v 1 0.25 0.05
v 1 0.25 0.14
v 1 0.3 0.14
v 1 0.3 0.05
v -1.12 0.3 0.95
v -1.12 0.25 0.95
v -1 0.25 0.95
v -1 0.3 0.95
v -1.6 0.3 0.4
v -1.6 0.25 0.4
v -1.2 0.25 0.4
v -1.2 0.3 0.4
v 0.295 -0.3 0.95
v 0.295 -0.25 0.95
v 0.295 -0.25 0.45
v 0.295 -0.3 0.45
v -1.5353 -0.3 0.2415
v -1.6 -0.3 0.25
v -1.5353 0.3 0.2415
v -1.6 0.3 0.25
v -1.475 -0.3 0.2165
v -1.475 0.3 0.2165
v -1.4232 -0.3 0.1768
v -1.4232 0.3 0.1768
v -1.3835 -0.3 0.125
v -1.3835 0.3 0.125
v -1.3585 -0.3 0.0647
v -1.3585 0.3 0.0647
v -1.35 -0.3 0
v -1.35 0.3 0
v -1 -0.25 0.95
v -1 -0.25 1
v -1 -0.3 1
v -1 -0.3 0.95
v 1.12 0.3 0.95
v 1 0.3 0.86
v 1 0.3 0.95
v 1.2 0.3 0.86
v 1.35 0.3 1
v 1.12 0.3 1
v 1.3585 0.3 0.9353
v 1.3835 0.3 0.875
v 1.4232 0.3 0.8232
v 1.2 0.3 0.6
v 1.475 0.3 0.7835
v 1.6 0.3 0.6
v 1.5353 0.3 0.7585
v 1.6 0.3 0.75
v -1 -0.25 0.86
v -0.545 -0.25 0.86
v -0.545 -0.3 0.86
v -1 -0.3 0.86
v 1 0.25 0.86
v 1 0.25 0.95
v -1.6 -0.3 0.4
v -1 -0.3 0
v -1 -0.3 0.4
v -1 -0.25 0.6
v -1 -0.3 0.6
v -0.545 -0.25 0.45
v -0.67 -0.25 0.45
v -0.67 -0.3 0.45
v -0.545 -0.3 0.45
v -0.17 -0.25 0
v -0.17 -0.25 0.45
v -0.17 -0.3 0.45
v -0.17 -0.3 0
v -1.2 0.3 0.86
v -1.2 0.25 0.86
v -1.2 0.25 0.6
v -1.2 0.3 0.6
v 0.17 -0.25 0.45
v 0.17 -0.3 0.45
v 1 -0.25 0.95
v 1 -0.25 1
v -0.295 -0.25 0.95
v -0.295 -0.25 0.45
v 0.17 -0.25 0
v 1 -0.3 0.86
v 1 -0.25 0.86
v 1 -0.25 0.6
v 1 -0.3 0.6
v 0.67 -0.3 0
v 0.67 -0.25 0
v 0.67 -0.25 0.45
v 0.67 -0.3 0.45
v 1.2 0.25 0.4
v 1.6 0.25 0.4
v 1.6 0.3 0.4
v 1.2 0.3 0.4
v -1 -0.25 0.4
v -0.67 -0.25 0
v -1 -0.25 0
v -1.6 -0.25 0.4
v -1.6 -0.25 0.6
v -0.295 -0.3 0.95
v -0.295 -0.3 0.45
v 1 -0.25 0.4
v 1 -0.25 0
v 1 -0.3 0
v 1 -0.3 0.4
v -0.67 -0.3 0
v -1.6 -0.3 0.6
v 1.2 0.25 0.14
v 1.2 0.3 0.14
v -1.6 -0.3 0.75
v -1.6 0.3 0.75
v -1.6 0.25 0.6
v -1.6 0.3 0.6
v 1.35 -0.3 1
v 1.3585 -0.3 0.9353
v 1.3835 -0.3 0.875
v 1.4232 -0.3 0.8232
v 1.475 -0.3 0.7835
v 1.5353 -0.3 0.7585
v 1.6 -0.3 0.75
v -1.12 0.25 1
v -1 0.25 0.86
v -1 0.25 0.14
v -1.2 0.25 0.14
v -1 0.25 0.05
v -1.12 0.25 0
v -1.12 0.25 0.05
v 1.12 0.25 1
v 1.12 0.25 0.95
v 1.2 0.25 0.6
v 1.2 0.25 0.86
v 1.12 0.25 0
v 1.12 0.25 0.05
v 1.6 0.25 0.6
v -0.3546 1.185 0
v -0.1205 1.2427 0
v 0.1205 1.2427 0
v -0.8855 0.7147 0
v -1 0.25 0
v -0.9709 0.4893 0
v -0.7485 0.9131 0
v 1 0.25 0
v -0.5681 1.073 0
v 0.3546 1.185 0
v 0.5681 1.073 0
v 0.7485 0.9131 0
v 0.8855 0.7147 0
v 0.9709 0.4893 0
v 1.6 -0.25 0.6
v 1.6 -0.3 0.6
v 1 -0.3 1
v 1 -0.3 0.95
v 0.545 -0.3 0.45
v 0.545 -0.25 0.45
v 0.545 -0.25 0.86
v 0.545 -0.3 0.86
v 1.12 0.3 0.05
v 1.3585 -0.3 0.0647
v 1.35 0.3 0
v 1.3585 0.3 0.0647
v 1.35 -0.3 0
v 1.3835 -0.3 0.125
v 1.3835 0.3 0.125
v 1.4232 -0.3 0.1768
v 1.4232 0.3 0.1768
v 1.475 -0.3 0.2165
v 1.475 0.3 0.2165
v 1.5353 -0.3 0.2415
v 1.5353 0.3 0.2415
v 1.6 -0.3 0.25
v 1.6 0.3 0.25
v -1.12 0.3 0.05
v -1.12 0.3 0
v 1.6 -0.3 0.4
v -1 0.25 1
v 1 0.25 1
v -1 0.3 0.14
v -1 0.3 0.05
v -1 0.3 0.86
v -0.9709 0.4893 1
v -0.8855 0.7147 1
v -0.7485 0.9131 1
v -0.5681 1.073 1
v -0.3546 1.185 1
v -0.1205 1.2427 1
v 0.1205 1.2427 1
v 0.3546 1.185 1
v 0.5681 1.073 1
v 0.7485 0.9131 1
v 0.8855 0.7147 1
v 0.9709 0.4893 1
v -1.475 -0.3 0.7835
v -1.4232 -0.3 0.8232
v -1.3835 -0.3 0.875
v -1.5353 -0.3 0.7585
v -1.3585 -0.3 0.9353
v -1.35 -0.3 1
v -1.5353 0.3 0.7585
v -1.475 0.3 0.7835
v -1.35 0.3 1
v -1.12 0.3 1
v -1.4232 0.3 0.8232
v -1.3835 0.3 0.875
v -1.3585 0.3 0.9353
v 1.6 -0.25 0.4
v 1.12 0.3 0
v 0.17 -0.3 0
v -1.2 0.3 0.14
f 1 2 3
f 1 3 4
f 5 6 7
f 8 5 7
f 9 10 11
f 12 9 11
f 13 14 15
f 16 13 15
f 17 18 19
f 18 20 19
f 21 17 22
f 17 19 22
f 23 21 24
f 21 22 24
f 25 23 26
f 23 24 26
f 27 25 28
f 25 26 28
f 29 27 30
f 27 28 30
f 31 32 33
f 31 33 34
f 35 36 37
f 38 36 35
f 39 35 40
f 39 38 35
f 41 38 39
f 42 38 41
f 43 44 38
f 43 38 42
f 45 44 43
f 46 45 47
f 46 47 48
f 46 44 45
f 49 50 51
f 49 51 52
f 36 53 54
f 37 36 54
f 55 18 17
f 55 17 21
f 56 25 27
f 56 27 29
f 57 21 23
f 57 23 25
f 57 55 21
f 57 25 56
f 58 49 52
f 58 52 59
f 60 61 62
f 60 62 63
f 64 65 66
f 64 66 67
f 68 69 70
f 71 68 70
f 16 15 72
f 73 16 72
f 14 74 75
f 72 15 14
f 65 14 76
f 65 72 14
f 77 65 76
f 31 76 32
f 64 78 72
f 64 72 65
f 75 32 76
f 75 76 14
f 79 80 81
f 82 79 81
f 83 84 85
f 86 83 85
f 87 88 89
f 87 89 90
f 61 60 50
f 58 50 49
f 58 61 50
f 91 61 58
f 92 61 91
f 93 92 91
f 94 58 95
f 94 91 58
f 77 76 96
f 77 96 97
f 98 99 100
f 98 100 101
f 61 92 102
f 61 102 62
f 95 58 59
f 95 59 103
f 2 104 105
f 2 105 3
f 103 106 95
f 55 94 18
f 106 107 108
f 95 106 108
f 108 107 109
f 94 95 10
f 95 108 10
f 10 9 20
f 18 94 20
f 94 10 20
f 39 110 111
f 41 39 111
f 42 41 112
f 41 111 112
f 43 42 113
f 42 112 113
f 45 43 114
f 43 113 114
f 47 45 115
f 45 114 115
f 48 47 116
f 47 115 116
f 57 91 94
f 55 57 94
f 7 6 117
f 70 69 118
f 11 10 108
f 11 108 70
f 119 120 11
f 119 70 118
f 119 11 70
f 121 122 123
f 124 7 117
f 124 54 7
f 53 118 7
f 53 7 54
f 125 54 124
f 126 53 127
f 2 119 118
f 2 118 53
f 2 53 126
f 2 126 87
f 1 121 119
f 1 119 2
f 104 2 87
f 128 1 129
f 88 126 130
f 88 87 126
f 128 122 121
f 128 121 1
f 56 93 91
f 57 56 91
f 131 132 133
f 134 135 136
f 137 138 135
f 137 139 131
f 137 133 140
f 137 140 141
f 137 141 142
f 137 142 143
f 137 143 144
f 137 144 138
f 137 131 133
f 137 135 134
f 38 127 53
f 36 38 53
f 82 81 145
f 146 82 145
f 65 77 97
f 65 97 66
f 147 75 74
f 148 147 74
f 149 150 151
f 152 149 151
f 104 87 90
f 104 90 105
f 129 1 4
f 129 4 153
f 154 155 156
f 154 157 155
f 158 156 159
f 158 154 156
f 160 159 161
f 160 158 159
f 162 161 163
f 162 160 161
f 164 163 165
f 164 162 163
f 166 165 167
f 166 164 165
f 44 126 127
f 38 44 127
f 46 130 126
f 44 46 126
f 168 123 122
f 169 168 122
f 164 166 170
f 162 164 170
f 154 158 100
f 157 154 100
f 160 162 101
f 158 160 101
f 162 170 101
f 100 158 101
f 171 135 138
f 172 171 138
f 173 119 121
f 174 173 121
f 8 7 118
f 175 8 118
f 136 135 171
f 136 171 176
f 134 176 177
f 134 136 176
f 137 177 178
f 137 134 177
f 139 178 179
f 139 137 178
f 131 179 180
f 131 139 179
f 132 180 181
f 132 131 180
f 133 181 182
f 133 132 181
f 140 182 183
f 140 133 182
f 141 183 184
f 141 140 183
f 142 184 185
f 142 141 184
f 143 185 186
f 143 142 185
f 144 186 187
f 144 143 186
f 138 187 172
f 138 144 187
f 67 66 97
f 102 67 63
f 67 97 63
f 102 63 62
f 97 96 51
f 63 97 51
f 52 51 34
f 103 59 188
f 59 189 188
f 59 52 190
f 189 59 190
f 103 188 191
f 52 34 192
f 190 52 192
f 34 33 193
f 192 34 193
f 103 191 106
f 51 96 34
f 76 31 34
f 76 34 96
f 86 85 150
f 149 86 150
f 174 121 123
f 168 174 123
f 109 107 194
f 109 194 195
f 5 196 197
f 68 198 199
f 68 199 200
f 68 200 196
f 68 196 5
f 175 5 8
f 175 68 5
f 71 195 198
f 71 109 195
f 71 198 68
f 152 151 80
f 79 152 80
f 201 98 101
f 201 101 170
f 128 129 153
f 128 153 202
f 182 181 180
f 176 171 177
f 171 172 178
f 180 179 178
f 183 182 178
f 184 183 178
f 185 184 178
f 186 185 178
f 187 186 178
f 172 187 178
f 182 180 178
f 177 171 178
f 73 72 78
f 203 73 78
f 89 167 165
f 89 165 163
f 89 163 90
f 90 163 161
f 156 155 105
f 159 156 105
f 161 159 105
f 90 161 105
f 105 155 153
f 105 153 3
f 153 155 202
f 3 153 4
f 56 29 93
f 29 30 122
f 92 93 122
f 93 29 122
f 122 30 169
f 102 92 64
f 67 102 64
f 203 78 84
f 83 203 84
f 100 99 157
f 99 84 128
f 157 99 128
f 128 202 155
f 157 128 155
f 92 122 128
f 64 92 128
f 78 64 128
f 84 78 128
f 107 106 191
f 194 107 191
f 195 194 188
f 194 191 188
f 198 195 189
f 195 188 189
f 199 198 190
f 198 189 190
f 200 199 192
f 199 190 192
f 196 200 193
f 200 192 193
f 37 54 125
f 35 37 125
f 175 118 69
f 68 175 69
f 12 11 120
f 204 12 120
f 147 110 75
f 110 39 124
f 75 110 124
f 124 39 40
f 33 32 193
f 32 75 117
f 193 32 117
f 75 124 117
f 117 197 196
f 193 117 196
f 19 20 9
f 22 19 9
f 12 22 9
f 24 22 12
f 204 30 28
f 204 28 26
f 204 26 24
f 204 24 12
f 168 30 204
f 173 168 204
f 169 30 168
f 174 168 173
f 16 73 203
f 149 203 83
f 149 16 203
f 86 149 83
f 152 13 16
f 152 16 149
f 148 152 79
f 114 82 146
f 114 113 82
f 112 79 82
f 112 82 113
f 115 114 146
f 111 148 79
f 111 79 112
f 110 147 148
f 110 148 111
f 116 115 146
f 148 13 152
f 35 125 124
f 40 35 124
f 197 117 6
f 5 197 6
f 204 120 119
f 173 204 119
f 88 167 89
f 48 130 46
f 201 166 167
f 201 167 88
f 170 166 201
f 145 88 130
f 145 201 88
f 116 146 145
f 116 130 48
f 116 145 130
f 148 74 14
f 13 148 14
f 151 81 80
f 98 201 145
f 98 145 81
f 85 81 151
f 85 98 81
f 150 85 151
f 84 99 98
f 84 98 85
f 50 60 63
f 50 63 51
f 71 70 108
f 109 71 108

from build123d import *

# Parameters (mm, degrees)
EXTRUDE_1_DEPTH     = 1
CUT_EXTRUDE_1_DEPTH = 0.5
EXTRUDE_2_DEPTH     = 0.05
EXTRUDE_4_DEPTH     = 0.05


# Read off the part's stored shape, not the designer's step: Разделить1
with BuildPart() as part:
    # Эскиз1 → Бобышка-Вытянуть1 (new body)
    with BuildSketch(Plane.XY):
        with BuildLine():
            Line((-1.6, 0.25), (-1, 0.25))
            ThreePointArc((-1, 0.25), (0, 1.25), (1, 0.25))
            Line((1, 0.25), (1.6, 0.25))
            Line((1.6, 0.25), (1.6, -0.25))
            Line((1.6, -0.25), (-1.6, -0.25))
            Line((-1.6, -0.25), (-1.6, 0.25))
        make_face()
    extrude(amount=EXTRUDE_1_DEPTH)


with BuildPart() as body_2:
    # Split Bodies 1: the piece on the far side of the plane
    add(part.part)
    split(bisect_by=Plane(origin=(0, 0.25, 0), x_dir=(1, 0, 0), z_dir=(0, 1, 0)), keep=Keep.BOTTOM)

    # Эскиз2 → Вырез-Вытянуть1 (cut)
    with BuildSketch(Plane.XZ.offset(0.25)):
        with BuildLine():
            Line((-1.35, 0), (-1.6, 0))
            Line((-1.6, 0), (-1.6, 0.25))
            ThreePointArc((-1.6, 0.25), (-1.423223305, 0.176776695), (-1.35, 0))
        make_face()
        with BuildLine():
            Line((-1.35, 1), (-1.6, 1))
            Line((-1.6, 1), (-1.6, 0.75))
            ThreePointArc((-1.6, 0.75), (-1.423223305, 0.823223305), (-1.35, 1))
        make_face()
        with BuildLine():
            Line((1.6, 0.75), (1.6, 1))
            Line((1.6, 1), (1.35, 1))
            ThreePointArc((1.35, 1), (1.423223305, 0.823223305), (1.6, 0.75))
        make_face()
        with BuildLine():
            Line((1.6, 0.25), (1.6, 0))
            Line((1.6, 0), (1.35, 0))
            ThreePointArc((1.35, 0), (1.423223305, 0.176776695), (1.6, 0.25))
        make_face()
    extrude(amount=-CUT_EXTRUDE_1_DEPTH, mode=Mode.SUBTRACT)

    # Эскиз3 → Бобышка-Вытянуть2 (add)
    with BuildSketch(Plane.XZ.offset(0.25)):
        with BuildLine():
            Line((-1, 0), (-1, 0.4))
            Line((-1, 0.4), (-1.6, 0.4))
            Line((-1.6, 0.4), (-1.6, 0.25))
            ThreePointArc((-1.6, 0.25), (-1.423223305, 0.176776695), (-1.35, 0))
            Line((-1.35, 0), (-1, 0))
        make_face()
        with BuildLine():
            Line((1, 0), (1, 0.4))
            Line((1, 0.4), (1.6, 0.4))
            Line((1.6, 0.4), (1.6, 0.25))
            ThreePointArc((1.6, 0.25), (1.423223305, 0.176776695), (1.35, 0))
            Line((1.35, 0), (1, 0))
        make_face()
        with BuildLine():
            Line((1, 1), (1, 0.95))
            Line((1, 0.95), (0.295, 0.95))
            Line((0.295, 0.95), (0.295, 0.45))
            Line((0.295, 0.45), (0.17, 0.45))
            Line((0.17, 0.45), (0.17, 0))
            Line((0.17, 0), (0.67, 0))
            Line((0.67, 0), (0.67, 0.45))
            Line((0.67, 0.45), (0.545, 0.45))
            Line((0.545, 0.45), (0.545, 0.86))
            Line((0.545, 0.86), (1, 0.86))
            Line((1, 0.86), (1, 0.6))
            Line((1, 0.6), (1.6, 0.6))
            Line((1.6, 0.6), (1.6, 0.75))
            ThreePointArc((1.6, 0.75), (1.423223305, 0.823223305), (1.35, 1))
            Line((1.35, 1), (1, 1))
        make_face()
        with BuildLine():
            Line((-1.35, 1), (-1, 1))
            Line((-1, 1), (-1, 0.95))
            Line((-1, 0.95), (-0.295, 0.95))
            Line((-0.295, 0.95), (-0.295, 0.45))
            Line((-0.295, 0.45), (-0.17, 0.45))
            Line((-0.17, 0.45), (-0.17, 0))
            Line((-0.17, 0), (-0.67, 0))
            Line((-0.67, 0), (-0.67, 0.45))
            Line((-0.67, 0.45), (-0.545, 0.45))
            Line((-0.545, 0.45), (-0.545, 0.86))
            Line((-0.545, 0.86), (-1, 0.86))
            Line((-1, 0.86), (-1, 0.6))
            Line((-1, 0.6), (-1.6, 0.6))
            Line((-1.6, 0.6), (-1.6, 0.75))
            ThreePointArc((-1.6, 0.75), (-1.423223305, 0.823223305), (-1.35, 1))
        make_face()
    extrude(amount=EXTRUDE_2_DEPTH)

    # Эскиз4 → Бобышка-Вытянуть4 (add)
    with BuildSketch(Plane(origin=(0, 0.25, 0), x_dir=(1, 0, 0), z_dir=(0, 1, 0))):
        with BuildLine():
            Line((1.6, -0.4), (1.2, -0.4))
            Line((1.2, -0.4), (1.2, -0.14))
            Line((1.2, -0.14), (1, -0.14))
            Line((1, -0.14), (1, -0.05))
            Line((1, -0.05), (1.12, -0.05))
            Line((1.12, -0.05), (1.12, 0))
            Line((1.12, 0), (1.35, 0))
            ThreePointArc((1.35, 0), (1.423223305, -0.176776695), (1.6, -0.25))
            Line((1.6, -0.25), (1.6, -0.4))
        make_face()
        with BuildLine():
            Line((1.6, -0.6), (1.2, -0.6))
            Line((1.2, -0.6), (1.2, -0.86))
            Line((1.2, -0.86), (1, -0.86))
            Line((1, -0.86), (1, -0.95))
            Line((1, -0.95), (1.12, -0.95))
            Line((1.12, -0.95), (1.12, -1))
            Line((1.12, -1), (1.35, -1))
            ThreePointArc((1.35, -1), (1.423223305, -0.823223305), (1.6, -0.75))
            Line((1.6, -0.75), (1.6, -0.6))
        make_face()
        with BuildLine():
            Line((-1.6, -0.25), (-1.6, -0.4))
            Line((-1.6, -0.4), (-1.2, -0.4))
            Line((-1.2, -0.4), (-1.2, -0.14))
            Line((-1.2, -0.14), (-1, -0.14))
            Line((-1, -0.14), (-1, -0.05))
            Line((-1, -0.05), (-1.12, -0.05))
            Line((-1.12, -0.05), (-1.12, 0))
            Line((-1.12, 0), (-1.35, 0))
            ThreePointArc((-1.35, 0), (-1.423223305, -0.176776695), (-1.6, -0.25))
        make_face()
        with BuildLine():
            Line((-1.35, -1), (-1.12, -1))
            Line((-1.12, -1), (-1.12, -0.95))
            Line((-1.12, -0.95), (-1, -0.95))
            Line((-1, -0.95), (-1, -0.86))
            Line((-1, -0.86), (-1.2, -0.86))
            Line((-1.2, -0.86), (-1.2, -0.6))
            Line((-1.2, -0.6), (-1.6, -0.6))
            Line((-1.6, -0.6), (-1.6, -0.75))
            ThreePointArc((-1.6, -0.75), (-1.423223305, -0.823223305), (-1.35, -1))
        make_face()
    extrude(amount=EXTRUDE_4_DEPTH)


with BuildPart() as part_1:
    add(part.part)

    # Split Bodies 1
    split(bisect_by=Plane(origin=(0, 0.25, 0), x_dir=(1, 0, 0), z_dir=(0, 1, 0)), keep=Keep.TOP)


solid = Compound([body_2.part, part_1.part])
